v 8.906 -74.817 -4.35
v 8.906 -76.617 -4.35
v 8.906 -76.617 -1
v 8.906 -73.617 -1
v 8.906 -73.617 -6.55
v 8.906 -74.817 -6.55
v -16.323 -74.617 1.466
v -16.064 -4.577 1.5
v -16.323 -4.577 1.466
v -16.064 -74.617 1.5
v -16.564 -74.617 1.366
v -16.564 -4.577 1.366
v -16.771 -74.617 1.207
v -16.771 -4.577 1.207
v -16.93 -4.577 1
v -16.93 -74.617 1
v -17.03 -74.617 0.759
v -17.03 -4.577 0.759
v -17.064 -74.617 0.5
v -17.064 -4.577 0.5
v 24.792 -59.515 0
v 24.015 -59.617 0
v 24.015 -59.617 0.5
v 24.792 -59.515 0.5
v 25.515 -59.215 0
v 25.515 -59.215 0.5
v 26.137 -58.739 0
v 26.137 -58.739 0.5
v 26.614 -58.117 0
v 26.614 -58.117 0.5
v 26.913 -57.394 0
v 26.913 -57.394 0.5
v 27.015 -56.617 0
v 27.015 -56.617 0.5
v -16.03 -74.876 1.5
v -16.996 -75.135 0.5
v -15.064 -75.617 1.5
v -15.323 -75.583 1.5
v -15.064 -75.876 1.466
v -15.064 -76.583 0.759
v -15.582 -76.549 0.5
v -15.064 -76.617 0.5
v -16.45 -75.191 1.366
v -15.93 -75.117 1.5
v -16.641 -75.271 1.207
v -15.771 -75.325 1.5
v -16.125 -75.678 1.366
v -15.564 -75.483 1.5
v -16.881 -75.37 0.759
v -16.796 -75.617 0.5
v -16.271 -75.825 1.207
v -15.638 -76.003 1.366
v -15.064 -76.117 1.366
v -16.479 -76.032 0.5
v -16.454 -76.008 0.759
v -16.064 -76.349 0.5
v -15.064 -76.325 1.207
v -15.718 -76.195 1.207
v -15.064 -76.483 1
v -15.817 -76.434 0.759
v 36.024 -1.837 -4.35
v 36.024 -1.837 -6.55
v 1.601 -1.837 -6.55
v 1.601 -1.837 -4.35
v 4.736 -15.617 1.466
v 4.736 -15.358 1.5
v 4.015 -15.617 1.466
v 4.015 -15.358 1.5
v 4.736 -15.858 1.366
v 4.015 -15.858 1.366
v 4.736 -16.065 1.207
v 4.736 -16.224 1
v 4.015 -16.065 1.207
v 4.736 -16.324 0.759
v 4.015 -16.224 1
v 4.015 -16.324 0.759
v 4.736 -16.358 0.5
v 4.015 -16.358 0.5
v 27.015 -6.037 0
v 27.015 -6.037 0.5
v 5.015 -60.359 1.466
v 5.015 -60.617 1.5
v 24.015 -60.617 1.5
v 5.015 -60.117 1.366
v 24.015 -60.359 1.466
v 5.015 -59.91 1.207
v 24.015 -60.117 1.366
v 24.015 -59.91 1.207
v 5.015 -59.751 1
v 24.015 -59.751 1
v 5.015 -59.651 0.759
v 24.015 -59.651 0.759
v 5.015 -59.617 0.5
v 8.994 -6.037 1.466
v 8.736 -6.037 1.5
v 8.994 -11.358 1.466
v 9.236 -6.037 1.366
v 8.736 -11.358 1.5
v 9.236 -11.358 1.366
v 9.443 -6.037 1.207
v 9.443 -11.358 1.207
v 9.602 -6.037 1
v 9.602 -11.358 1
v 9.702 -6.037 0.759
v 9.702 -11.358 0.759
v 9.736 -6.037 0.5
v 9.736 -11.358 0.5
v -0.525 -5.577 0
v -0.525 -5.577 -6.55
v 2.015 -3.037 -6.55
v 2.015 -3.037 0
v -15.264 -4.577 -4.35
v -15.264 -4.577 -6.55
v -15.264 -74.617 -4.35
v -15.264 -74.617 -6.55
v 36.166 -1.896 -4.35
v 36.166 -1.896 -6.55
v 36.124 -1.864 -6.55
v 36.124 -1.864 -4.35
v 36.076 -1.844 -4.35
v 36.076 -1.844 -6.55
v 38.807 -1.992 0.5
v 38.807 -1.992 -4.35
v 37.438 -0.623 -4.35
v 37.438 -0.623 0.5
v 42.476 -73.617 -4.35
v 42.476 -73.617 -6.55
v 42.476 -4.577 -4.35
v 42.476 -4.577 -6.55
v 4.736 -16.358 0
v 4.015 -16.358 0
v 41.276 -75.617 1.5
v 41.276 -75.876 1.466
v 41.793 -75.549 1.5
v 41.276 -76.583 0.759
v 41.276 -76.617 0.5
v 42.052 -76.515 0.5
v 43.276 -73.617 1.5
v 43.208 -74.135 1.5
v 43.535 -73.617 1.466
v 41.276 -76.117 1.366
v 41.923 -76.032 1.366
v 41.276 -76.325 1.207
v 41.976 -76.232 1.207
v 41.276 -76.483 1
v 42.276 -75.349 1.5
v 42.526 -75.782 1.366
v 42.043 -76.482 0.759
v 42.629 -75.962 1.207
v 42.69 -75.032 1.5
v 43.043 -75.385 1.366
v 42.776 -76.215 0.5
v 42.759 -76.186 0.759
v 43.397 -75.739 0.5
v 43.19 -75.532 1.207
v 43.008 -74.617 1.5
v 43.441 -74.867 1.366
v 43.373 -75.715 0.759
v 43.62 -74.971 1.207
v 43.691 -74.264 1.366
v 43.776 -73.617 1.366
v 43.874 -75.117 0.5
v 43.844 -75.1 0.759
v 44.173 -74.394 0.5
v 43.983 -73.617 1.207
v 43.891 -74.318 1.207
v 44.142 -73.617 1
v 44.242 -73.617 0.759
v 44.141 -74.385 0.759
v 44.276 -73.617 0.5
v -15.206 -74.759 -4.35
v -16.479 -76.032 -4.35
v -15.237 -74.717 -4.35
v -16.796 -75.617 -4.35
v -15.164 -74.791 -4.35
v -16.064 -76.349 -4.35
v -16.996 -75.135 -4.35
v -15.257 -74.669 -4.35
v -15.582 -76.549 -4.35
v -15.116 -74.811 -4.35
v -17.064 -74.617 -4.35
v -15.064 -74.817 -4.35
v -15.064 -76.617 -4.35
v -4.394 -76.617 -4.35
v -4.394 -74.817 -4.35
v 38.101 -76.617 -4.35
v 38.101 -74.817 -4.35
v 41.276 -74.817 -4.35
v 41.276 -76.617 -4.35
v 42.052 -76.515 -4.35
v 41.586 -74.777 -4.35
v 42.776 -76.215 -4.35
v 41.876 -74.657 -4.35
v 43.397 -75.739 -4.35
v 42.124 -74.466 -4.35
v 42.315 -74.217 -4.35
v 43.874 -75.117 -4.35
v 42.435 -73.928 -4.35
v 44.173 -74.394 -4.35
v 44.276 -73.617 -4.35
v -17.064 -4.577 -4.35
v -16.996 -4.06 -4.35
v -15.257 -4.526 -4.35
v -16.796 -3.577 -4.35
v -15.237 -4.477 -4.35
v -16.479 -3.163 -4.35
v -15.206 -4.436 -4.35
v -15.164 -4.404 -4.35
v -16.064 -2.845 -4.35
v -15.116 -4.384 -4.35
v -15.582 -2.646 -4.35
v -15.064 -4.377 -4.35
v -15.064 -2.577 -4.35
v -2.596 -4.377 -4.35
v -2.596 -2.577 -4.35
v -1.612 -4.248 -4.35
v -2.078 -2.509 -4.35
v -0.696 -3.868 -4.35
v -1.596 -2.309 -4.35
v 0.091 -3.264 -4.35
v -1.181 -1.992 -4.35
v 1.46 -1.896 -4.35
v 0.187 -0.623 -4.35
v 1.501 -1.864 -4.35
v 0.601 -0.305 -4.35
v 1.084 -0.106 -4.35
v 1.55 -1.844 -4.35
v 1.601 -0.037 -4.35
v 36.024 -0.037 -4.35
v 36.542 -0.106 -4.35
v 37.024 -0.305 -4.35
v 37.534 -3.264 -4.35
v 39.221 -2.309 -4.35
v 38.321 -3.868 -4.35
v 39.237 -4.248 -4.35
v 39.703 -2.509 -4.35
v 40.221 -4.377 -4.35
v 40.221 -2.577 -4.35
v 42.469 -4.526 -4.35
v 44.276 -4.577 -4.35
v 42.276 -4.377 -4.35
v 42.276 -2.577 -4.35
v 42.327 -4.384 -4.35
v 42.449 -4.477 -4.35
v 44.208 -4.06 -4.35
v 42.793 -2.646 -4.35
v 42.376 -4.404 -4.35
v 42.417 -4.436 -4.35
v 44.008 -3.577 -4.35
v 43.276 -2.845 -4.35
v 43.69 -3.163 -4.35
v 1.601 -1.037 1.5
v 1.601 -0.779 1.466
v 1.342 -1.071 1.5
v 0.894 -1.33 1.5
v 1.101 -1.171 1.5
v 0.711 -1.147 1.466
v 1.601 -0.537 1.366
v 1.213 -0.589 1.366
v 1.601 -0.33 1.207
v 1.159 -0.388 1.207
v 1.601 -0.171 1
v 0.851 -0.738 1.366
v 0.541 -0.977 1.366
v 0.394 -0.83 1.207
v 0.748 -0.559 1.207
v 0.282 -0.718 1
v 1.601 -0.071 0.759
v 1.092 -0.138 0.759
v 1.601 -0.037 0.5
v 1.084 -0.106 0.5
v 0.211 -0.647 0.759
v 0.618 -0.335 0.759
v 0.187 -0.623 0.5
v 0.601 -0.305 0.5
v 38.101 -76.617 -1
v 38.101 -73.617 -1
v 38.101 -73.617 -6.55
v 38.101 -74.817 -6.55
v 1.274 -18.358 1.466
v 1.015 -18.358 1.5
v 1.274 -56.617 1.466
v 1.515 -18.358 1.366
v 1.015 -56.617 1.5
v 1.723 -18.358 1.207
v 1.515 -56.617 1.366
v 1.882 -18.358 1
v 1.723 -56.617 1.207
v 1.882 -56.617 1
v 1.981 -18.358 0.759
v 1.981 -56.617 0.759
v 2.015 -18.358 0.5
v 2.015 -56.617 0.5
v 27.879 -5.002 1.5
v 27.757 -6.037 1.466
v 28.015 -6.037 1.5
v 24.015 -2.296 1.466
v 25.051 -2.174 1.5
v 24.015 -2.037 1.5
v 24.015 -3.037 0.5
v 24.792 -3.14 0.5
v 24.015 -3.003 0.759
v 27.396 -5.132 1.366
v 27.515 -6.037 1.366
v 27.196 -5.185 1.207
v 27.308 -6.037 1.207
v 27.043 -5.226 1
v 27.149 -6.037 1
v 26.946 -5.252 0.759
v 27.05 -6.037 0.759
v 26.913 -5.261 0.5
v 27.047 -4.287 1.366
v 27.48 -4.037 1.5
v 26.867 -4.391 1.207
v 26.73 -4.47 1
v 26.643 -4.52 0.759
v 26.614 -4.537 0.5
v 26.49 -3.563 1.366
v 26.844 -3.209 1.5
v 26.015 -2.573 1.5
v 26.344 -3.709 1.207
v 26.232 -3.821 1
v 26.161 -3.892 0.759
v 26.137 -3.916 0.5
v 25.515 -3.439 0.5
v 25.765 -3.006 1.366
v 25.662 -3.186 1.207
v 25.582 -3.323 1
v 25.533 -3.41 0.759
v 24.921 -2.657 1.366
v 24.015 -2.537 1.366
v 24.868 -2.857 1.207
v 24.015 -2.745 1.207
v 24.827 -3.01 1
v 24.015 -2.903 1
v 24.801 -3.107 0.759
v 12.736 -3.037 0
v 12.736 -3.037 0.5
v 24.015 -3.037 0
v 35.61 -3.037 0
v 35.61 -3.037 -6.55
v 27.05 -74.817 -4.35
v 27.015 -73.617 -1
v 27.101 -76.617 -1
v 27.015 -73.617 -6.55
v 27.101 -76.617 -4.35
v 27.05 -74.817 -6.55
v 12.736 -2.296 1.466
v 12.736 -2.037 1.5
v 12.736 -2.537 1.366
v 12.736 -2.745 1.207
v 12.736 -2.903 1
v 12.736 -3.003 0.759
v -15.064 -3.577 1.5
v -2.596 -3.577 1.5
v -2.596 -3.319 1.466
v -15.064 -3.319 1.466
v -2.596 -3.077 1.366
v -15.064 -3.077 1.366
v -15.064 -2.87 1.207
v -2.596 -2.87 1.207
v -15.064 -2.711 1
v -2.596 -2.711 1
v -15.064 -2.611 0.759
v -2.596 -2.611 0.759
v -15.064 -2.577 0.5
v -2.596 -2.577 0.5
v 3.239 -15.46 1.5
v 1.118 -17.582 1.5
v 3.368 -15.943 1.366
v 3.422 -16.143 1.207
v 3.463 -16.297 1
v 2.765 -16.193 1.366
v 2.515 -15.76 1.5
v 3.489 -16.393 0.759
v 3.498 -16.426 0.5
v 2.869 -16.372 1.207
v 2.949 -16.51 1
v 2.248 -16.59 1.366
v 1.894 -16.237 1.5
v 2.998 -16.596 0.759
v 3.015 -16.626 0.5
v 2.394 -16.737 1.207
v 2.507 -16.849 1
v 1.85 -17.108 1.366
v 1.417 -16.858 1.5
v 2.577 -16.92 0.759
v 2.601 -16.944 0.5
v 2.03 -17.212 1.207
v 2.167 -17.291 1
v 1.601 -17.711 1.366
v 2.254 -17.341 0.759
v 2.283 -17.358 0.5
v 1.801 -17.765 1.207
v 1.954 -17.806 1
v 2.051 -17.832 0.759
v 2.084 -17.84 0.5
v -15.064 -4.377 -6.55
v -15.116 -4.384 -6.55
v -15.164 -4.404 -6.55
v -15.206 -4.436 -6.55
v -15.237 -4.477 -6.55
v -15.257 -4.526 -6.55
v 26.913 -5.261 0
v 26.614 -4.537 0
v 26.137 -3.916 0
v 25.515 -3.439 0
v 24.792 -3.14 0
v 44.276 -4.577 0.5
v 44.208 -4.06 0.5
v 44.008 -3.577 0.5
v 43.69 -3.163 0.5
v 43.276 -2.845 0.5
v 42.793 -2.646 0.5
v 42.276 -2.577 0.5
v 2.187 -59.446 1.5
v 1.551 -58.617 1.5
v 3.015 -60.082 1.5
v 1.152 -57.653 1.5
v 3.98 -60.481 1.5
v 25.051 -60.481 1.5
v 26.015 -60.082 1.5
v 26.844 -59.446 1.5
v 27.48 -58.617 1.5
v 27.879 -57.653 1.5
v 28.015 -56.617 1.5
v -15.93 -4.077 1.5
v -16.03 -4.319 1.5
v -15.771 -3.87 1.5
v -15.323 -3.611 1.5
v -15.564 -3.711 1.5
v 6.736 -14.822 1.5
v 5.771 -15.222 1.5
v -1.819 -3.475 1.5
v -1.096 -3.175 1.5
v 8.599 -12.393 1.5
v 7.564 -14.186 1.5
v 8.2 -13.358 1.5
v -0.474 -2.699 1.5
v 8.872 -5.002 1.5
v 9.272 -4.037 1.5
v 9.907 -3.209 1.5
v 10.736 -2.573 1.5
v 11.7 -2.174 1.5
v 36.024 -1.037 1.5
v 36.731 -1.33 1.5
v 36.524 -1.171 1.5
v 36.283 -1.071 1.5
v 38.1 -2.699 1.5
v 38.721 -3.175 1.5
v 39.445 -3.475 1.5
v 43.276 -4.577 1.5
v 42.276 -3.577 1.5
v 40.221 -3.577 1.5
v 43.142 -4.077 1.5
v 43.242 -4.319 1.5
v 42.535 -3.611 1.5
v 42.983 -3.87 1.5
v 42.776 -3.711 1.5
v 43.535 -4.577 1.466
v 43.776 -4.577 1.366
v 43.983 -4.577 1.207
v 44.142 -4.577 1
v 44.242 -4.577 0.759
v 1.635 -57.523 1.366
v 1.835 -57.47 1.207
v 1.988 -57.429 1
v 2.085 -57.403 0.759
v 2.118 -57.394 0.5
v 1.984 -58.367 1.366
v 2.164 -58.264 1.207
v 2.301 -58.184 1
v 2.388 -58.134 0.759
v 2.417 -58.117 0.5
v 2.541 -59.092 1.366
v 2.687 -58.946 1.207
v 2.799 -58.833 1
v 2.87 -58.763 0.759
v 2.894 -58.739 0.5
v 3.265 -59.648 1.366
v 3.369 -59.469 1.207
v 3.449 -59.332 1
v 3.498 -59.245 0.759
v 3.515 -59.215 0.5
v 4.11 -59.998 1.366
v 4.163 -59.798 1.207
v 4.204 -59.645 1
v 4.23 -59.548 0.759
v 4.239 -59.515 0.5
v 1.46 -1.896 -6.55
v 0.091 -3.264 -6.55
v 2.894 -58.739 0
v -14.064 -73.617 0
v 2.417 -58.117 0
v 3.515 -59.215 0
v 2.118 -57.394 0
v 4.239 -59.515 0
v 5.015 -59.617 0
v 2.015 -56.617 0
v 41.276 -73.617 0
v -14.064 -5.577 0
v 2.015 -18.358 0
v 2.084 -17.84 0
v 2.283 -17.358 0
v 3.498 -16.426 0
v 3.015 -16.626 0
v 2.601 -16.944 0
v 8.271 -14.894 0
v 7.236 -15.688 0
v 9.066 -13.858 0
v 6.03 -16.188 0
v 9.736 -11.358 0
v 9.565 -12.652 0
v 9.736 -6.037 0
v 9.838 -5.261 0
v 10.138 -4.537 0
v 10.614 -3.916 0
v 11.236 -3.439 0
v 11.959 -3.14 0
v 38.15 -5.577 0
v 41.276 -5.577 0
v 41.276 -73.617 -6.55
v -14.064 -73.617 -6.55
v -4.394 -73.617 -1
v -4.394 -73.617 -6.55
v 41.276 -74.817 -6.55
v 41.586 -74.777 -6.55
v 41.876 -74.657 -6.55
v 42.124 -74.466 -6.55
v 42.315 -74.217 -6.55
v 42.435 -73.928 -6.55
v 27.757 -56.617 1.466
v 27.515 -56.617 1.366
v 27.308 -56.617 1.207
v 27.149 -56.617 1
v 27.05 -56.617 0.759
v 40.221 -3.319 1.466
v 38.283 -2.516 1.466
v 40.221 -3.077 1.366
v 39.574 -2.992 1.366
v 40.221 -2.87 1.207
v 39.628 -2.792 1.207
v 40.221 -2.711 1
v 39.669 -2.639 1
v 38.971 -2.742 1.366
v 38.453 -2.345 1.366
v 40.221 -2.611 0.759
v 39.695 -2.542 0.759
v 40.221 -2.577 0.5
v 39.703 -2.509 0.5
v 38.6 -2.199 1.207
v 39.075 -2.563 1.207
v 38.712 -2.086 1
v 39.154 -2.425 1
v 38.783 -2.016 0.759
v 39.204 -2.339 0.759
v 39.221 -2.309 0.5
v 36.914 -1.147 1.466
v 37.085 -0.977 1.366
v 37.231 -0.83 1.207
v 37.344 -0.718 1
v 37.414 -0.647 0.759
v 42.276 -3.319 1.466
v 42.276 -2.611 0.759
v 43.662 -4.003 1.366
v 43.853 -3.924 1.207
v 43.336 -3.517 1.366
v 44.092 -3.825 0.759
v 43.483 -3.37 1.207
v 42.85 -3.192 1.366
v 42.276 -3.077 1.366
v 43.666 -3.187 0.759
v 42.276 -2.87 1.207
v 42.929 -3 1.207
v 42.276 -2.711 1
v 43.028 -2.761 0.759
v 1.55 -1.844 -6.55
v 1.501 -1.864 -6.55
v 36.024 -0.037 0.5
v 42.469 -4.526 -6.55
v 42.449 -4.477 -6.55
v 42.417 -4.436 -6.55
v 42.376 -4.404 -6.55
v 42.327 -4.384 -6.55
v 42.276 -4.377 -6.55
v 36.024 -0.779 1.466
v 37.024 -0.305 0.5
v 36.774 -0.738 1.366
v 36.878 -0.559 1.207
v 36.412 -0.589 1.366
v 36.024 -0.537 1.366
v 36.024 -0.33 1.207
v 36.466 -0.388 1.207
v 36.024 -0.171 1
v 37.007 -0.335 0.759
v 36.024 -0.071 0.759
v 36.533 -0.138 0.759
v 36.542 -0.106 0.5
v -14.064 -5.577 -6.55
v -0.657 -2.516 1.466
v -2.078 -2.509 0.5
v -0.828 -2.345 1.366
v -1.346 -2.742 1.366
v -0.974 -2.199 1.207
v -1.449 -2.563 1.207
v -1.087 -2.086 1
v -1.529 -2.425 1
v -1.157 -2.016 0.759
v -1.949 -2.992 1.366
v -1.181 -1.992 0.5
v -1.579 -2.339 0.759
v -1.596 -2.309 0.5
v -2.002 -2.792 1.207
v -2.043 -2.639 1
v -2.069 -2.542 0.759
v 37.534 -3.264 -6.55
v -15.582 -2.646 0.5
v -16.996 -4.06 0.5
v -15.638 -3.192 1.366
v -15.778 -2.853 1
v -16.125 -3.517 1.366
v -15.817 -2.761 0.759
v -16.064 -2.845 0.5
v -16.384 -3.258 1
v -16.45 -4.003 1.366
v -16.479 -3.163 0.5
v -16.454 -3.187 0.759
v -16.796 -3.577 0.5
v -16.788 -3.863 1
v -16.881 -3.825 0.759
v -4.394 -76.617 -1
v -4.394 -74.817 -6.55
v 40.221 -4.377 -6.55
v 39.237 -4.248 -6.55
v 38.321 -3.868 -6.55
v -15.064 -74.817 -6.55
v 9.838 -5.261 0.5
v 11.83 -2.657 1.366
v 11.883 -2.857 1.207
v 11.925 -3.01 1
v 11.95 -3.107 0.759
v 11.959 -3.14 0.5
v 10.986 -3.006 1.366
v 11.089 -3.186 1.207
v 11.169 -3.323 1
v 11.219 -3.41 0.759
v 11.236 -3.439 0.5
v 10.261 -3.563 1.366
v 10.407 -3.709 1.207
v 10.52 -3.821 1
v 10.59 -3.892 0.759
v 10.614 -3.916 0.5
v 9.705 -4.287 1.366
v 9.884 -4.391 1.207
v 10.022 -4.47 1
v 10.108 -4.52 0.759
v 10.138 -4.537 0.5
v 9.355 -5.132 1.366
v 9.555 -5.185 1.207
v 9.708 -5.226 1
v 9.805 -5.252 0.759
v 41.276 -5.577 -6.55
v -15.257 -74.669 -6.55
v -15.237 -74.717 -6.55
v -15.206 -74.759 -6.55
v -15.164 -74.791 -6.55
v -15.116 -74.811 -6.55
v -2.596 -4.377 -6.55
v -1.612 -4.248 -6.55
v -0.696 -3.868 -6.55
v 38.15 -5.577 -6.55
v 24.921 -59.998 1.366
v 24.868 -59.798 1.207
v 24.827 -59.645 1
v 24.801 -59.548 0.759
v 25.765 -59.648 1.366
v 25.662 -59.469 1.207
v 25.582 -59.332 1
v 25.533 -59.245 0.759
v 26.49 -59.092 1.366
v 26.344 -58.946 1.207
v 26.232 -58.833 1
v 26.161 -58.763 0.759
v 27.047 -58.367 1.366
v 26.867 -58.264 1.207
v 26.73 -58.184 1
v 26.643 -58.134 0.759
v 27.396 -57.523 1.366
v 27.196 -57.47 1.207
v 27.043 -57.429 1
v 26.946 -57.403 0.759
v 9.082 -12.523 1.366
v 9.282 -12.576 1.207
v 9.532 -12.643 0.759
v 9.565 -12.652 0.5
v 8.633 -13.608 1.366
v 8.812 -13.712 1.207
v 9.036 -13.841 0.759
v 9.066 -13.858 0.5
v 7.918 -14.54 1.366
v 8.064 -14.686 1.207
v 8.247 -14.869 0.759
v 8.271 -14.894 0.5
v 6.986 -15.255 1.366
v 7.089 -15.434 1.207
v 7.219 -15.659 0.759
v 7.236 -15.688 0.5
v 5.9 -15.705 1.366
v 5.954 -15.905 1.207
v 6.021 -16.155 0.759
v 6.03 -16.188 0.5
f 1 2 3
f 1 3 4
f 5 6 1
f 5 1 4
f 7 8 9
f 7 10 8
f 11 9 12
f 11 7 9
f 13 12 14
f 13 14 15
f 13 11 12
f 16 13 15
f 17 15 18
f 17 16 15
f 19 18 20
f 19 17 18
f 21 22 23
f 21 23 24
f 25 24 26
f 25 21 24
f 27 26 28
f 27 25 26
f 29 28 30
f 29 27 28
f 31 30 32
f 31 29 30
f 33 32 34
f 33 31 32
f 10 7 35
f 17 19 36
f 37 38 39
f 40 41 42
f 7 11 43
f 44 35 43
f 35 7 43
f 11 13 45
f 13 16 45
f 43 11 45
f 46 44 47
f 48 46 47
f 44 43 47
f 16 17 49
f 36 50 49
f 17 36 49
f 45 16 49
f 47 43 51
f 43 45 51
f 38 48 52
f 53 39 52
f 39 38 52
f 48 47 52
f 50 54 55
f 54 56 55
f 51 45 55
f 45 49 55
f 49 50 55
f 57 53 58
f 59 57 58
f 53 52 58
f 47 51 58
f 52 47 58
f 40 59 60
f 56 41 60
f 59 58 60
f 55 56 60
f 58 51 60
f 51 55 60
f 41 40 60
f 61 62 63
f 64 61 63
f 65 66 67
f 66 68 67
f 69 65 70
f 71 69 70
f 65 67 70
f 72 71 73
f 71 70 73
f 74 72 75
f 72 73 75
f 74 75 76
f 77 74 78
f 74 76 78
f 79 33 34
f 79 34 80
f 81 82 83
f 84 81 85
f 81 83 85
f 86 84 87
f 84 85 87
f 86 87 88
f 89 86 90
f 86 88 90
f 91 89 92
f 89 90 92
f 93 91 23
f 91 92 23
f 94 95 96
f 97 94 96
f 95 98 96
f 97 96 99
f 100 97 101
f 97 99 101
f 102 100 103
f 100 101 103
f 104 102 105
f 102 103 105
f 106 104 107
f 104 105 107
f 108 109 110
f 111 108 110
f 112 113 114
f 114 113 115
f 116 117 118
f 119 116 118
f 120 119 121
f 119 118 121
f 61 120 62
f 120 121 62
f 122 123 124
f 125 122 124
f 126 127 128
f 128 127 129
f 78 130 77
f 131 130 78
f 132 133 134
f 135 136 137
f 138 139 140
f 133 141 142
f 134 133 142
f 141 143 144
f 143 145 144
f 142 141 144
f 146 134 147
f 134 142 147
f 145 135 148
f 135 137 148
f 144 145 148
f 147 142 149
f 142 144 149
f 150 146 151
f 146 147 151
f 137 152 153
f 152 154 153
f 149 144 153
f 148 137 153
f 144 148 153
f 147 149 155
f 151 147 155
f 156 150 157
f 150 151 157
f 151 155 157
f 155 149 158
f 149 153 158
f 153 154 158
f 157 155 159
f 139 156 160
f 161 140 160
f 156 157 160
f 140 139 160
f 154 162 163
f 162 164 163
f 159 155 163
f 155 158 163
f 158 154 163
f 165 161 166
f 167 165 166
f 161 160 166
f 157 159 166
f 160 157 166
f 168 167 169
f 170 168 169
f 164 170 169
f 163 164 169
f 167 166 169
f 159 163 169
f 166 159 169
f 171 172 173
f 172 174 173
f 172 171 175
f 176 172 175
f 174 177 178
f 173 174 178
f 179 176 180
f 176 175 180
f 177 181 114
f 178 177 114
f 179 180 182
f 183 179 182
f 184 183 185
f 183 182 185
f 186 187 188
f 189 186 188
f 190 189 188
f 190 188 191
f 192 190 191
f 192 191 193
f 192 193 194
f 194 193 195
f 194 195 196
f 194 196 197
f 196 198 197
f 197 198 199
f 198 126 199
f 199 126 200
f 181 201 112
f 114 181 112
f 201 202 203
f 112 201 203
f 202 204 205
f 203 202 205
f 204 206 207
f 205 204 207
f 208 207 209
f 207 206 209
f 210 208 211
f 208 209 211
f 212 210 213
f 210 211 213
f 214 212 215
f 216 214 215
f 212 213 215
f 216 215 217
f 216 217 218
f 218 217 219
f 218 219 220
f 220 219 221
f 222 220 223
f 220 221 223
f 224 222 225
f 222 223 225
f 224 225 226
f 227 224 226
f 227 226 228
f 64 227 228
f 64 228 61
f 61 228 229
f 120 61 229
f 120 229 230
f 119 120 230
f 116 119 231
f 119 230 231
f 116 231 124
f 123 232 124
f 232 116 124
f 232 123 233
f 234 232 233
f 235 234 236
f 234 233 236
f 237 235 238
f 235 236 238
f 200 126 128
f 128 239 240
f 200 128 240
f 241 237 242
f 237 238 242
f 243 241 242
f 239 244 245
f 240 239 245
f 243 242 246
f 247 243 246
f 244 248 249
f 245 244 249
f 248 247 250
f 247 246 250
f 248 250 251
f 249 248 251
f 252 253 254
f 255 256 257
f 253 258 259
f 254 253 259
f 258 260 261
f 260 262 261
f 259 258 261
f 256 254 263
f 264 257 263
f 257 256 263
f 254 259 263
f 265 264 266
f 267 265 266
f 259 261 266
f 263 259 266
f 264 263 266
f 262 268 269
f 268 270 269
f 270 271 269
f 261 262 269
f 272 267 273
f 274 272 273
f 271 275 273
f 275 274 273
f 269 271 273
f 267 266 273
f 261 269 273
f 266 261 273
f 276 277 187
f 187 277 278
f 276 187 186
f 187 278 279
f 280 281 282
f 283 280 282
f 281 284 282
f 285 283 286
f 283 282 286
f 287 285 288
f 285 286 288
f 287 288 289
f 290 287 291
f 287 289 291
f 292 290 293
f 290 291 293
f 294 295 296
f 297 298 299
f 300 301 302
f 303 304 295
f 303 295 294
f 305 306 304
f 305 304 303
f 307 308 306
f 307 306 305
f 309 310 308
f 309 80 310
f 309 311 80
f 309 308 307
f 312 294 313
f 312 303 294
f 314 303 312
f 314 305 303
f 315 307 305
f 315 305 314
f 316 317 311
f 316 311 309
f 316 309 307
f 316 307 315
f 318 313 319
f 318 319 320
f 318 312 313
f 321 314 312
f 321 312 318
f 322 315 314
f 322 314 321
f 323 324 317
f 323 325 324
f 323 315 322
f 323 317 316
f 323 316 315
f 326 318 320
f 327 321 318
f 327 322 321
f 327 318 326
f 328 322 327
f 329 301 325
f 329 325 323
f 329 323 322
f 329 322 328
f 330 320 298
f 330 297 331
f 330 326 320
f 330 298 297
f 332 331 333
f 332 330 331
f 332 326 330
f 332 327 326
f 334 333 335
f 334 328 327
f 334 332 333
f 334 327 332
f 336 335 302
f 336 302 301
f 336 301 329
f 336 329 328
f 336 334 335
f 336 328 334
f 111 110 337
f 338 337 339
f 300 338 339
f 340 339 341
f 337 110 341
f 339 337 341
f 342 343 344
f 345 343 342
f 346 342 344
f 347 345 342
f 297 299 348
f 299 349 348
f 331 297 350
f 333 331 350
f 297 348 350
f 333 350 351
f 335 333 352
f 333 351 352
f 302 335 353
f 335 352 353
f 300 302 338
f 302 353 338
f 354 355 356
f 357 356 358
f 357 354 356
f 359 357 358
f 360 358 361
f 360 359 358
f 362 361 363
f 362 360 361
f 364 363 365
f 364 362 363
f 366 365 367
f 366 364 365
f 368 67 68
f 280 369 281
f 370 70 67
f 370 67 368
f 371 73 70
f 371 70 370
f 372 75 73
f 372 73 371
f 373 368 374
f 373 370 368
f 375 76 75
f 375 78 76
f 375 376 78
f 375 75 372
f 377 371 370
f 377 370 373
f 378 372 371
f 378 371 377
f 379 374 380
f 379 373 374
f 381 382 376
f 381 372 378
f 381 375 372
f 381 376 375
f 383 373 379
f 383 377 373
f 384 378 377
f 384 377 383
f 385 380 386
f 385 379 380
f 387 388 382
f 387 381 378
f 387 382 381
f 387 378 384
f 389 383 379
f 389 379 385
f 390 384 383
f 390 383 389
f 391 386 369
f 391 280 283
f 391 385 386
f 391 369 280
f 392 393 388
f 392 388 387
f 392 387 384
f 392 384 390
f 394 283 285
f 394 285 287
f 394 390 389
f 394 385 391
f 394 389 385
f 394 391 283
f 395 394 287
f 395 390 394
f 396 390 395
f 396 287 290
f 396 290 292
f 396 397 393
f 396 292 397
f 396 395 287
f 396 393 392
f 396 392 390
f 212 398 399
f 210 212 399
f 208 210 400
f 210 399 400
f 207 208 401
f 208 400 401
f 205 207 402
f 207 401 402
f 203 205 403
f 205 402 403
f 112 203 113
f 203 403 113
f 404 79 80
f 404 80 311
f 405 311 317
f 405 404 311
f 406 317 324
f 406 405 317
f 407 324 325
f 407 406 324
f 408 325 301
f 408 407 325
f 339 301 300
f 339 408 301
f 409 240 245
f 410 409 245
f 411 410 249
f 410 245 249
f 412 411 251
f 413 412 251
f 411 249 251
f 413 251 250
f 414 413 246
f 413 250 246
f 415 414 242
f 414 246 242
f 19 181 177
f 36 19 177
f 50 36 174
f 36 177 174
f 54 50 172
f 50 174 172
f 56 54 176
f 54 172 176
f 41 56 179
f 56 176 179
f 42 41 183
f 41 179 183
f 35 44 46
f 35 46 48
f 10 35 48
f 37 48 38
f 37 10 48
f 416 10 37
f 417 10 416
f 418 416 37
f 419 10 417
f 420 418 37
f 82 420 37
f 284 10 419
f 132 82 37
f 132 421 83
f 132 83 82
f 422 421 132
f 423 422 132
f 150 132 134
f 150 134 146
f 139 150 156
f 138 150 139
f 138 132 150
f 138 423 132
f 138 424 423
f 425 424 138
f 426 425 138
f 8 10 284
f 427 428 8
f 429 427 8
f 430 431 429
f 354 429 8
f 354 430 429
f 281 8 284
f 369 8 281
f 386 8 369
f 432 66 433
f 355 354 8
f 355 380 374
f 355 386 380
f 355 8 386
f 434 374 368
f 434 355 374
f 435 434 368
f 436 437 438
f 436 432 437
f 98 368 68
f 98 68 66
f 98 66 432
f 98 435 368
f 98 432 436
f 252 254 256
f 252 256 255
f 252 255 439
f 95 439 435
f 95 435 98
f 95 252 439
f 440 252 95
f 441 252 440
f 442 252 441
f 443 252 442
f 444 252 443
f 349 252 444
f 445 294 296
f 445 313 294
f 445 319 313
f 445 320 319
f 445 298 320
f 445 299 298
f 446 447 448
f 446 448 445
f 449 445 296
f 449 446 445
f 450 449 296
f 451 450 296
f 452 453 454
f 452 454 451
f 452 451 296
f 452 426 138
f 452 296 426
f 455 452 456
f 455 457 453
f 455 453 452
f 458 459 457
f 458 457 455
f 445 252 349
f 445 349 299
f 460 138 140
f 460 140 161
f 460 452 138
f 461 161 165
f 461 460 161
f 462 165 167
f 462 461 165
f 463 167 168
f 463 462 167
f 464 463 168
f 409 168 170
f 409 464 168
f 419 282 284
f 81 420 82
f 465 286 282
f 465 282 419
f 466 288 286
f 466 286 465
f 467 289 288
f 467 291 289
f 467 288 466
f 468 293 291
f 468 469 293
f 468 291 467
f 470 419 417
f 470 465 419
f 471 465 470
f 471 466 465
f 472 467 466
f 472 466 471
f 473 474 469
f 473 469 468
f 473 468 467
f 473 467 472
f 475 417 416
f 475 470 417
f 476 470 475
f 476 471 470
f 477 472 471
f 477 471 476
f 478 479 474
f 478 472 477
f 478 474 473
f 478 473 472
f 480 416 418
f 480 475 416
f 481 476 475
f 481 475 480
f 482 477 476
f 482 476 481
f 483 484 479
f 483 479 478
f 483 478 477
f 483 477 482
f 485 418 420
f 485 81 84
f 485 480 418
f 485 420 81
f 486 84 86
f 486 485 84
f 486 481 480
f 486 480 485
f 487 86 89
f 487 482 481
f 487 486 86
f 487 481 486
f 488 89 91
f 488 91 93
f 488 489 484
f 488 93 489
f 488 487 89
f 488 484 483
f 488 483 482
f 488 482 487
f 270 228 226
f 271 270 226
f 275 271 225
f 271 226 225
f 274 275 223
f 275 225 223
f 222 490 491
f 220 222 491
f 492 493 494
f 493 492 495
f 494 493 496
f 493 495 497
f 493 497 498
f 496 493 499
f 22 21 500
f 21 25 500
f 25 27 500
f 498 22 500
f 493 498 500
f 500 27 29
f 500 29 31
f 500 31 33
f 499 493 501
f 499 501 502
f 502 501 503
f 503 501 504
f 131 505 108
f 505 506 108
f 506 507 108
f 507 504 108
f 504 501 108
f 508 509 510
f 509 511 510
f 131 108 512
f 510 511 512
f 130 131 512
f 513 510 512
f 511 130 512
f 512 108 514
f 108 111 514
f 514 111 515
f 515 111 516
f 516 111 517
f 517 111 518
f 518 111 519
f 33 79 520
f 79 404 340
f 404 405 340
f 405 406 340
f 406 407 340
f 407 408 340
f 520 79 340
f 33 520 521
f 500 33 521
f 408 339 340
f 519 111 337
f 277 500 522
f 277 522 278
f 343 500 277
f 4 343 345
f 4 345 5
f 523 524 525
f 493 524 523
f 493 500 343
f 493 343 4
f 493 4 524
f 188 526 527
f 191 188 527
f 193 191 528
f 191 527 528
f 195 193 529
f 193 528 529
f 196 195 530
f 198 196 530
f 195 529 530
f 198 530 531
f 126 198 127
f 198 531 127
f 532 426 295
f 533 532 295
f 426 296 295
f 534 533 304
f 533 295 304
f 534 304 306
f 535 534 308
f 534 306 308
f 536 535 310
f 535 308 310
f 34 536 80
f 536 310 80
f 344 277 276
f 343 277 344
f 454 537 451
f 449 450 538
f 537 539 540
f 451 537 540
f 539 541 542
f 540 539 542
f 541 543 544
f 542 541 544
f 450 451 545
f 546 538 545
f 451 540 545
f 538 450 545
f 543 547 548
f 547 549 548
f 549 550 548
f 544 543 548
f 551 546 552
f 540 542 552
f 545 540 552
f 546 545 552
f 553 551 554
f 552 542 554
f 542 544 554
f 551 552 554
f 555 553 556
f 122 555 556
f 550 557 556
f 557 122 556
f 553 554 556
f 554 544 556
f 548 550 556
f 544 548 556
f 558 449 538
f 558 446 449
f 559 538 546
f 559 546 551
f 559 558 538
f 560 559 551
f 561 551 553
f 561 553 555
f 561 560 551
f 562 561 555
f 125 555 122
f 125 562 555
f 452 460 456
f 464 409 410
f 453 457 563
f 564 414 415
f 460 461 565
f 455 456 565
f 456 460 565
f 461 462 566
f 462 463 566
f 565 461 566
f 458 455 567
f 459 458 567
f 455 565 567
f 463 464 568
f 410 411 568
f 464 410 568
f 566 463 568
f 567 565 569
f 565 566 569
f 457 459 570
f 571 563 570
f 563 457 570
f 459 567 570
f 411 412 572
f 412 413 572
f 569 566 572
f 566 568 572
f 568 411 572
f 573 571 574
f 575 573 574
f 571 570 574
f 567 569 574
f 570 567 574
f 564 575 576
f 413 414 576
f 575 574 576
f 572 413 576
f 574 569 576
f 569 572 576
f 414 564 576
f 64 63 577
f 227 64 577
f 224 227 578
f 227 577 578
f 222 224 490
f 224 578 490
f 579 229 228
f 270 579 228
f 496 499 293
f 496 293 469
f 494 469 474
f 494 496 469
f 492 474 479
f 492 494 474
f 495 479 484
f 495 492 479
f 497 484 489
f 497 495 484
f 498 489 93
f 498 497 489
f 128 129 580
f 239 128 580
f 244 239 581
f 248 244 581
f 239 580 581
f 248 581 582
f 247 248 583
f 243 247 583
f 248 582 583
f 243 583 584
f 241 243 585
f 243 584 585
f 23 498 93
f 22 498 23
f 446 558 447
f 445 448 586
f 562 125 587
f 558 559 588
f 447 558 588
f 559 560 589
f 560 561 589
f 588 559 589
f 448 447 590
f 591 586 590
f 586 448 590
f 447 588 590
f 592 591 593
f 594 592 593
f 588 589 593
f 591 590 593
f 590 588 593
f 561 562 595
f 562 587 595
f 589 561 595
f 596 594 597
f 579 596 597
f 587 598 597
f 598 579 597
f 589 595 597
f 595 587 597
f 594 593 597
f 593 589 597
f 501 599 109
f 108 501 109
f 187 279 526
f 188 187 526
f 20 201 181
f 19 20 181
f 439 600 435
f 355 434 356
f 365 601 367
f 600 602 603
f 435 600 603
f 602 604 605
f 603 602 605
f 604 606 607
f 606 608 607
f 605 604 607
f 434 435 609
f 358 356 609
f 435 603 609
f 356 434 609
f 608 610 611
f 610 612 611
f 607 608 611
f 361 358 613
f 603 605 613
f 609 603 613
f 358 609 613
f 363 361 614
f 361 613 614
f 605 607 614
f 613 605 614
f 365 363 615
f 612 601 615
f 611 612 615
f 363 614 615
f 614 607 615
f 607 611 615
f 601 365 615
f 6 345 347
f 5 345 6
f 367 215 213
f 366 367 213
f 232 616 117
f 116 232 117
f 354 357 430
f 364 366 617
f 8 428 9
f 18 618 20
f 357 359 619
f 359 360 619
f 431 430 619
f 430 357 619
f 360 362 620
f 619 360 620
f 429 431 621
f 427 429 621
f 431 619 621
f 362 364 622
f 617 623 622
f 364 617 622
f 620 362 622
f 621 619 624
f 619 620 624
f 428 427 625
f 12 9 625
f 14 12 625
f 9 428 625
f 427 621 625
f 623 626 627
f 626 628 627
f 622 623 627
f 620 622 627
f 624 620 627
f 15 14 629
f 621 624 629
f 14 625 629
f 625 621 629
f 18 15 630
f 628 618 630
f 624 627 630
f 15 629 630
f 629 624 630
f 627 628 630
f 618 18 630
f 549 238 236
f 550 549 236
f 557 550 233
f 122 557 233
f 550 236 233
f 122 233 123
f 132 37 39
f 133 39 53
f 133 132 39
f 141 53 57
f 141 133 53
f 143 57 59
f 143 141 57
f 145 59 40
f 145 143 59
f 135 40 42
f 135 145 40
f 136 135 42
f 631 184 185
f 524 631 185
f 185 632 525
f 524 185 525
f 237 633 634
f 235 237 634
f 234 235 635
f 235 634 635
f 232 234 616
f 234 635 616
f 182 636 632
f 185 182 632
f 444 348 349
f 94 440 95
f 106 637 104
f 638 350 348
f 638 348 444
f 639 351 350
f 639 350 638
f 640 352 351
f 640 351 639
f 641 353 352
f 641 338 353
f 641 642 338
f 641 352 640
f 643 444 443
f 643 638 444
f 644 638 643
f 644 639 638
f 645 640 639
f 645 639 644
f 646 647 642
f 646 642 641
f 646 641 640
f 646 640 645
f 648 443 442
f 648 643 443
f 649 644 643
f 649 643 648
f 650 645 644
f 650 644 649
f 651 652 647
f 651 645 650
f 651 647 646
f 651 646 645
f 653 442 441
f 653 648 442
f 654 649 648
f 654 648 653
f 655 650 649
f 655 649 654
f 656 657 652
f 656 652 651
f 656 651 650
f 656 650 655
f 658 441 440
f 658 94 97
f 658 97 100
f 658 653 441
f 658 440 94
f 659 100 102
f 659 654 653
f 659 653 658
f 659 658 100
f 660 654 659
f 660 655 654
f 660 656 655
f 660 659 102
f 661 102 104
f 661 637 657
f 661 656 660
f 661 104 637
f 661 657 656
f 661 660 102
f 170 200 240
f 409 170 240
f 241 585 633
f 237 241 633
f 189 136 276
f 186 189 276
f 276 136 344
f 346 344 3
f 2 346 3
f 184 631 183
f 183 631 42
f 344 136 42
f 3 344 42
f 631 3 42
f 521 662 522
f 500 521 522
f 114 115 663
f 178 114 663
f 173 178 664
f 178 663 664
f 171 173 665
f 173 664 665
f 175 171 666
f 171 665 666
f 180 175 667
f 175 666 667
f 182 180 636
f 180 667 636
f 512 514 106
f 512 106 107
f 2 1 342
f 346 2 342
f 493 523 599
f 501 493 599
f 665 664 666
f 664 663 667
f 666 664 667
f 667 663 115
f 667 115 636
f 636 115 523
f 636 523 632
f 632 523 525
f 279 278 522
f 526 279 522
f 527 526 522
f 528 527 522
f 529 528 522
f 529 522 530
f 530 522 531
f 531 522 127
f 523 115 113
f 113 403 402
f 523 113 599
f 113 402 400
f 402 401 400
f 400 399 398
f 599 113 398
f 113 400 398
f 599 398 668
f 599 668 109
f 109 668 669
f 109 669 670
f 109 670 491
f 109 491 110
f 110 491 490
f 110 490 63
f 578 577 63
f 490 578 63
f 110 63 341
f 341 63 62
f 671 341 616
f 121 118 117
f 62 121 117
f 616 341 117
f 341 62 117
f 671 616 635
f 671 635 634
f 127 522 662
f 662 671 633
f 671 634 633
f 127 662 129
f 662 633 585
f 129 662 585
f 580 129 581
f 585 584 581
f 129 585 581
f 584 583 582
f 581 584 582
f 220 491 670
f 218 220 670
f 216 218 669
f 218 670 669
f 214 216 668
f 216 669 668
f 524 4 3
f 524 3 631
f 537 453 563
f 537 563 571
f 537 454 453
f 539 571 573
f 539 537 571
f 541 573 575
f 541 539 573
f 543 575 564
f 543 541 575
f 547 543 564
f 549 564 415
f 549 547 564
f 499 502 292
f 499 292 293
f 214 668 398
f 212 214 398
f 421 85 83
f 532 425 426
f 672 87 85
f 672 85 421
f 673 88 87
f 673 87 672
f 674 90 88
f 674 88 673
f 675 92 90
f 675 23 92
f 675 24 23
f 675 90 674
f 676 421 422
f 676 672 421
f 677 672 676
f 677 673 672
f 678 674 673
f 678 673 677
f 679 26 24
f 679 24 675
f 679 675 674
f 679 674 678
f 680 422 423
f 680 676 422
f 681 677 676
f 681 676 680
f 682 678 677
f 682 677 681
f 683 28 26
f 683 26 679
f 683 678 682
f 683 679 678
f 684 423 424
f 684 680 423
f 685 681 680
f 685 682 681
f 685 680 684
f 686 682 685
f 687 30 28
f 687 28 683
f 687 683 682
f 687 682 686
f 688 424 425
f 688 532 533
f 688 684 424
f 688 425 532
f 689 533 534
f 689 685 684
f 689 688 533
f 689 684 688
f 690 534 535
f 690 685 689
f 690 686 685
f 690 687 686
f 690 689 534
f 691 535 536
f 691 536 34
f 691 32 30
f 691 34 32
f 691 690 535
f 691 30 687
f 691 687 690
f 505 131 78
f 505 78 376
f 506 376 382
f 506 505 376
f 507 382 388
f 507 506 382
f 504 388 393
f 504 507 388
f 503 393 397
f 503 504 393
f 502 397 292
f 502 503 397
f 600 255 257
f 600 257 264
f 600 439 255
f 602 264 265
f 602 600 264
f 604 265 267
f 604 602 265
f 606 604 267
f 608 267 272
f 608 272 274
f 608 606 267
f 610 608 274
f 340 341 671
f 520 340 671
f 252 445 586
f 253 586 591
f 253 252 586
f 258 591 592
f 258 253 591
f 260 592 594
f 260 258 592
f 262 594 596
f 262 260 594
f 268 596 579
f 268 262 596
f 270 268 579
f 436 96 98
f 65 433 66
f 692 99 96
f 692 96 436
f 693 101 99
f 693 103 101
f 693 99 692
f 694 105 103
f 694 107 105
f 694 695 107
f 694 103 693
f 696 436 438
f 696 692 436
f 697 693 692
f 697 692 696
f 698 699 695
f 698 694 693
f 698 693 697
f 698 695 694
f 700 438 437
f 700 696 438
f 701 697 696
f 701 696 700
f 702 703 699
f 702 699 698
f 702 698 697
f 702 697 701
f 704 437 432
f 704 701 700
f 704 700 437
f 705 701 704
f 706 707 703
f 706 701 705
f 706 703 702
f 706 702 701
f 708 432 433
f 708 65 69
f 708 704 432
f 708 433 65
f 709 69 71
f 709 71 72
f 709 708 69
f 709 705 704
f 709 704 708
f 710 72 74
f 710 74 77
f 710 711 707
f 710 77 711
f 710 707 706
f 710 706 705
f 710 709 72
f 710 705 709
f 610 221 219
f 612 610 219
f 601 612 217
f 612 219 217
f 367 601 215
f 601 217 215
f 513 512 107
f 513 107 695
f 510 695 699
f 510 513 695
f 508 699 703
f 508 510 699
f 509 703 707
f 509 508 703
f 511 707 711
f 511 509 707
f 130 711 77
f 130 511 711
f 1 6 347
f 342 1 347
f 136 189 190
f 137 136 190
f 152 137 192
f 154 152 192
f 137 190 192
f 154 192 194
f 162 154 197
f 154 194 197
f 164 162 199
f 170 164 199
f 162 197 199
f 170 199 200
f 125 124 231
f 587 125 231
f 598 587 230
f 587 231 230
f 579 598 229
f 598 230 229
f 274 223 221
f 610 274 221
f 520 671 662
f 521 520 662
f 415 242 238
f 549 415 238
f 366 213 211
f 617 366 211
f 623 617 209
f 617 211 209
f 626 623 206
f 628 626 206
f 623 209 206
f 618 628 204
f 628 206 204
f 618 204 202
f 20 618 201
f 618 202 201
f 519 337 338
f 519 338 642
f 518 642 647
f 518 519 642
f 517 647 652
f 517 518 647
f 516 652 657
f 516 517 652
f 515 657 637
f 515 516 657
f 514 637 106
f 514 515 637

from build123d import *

# Parameters (mm, degrees)
BOSS_EXTRUDE1_DEPTH = 1.5
BOSS_EXTRUDE2_START = 6.55
BOSS_EXTRUDE2_DEPTH = 6.55
SKETCH4_W           = 11.085213563
SKETCH4_H           = 3
SKETCH4_W_2         = 13.3
BOSS_EXTRUDE4_DEPTH = 1
CUT_EXTRUDE1_DEPTH  = 2.2
FILLET1_R           = 1


with BuildPart() as part:
    # Sketch2 → Boss-Extrude1 (new body)
    with BuildSketch(Plane.XY):
        with BuildLine():
            Line((-15.064293146, -76.617402573), (-4.394293146, -76.617402573))
            Line((-4.394293146, -76.617402573), (41.275706854, -76.617402573))
            ThreePointArc((41.275706854, -76.617402573), (43.397027197, -75.738722916), (44.275706854, -73.617402573))
            Line((44.275706854, -73.617402573), (44.275706854, -4.577402573))
            ThreePointArc((44.275706854, -4.577402573), (43.689920416, -3.16318901), (42.275706854, -2.577402573))
            Line((42.275706854, -2.577402573), (40.220988228, -2.577402573))
            ThreePointArc((40.220988228, -2.577402573), (39.455621363, -2.425161638), (38.806774666, -1.991616135))
            Line((38.806774666, -1.991616135), (37.438347541, -0.62318901))
            ThreePointArc((37.438347541, -0.62318901), (36.789500843, -0.189643508), (36.024133979, -0.037402573))
            Line((36.024133979, -0.037402573), (1.601279729, -0.037402573))
            ThreePointArc((1.601279729, -0.037402573), (0.835912864, -0.189643508), (0.187066167, -0.62318901))
            Line((0.187066167, -0.62318901), (-1.181360958, -1.991616135))
            ThreePointArc((-1.181360958, -1.991616135), (-1.830207656, -2.425161638), (-2.59557452, -2.577402573))
            Line((-2.59557452, -2.577402573), (-15.064293146, -2.577402573))
            ThreePointArc((-15.064293146, -2.577402573), (-16.478506709, -3.16318901), (-17.064293146, -4.577402573))
            Line((-17.064293146, -4.577402573), (-17.064293146, -74.617402573))
            ThreePointArc((-17.064293146, -74.617402573), (-16.478506709, -76.031616135), (-15.064293146, -76.617402573))
        make_face()
        with BuildLine():
            Line((5.015493291, -59.617402573), (24.015493291, -59.617402573))
            ThreePointArc((24.015493291, -59.617402573), (26.136813635, -58.738722916), (27.015493291, -56.617402573))
            Line((27.015493291, -56.617402573), (27.015493291, -6.037402573))
            ThreePointArc((27.015493291, -6.037402573), (26.136813635, -3.916082229), (24.015493291, -3.037402573))
            Line((24.015493291, -3.037402573), (12.735677005, -3.037402573))
            ThreePointArc((12.735677005, -3.037402573), (10.614356661, -3.916082229), (9.735677005, -6.037402573))
            Line((9.735677005, -6.037402573), (9.735677005, -11.358022899))
            ThreePointArc((9.735677005, -11.358022899), (8.271210911, -14.893556805), (4.735677005, -16.358022899))
            Line((4.735677005, -16.358022899), (4.015493291, -16.358022899))
            ThreePointArc((4.015493291, -16.358022899), (2.601279729, -16.943809336), (2.015493291, -18.358022899))
            Line((2.015493291, -18.358022899), (2.015493291, -56.617402573))
            ThreePointArc((2.015493291, -56.617402573), (2.894172948, -58.738722916), (5.015493291, -59.617402573))
        make_face(mode=Mode.SUBTRACT)
    extrude(amount=BOSS_EXTRUDE1_DEPTH)

    # Sketch3 → Boss-Extrude2 (add)
    with BuildSketch(Plane(origin=(0, 0, 0), x_dir=(-1, 0, 0), z_dir=(0, 0, -1)).offset(BOSS_EXTRUDE2_START)):
        with BuildLine():
            Line((4.394293146, -75.117402573), (4.394293146, -73.617402573))
            Line((4.394293146, -73.617402573), (14.064293146, -73.617402573))
            Line((14.064293146, -73.617402573), (14.064293146, -5.577402573))
            Line((14.064293146, -5.577402573), (0.524506709, -5.577402573))
            Line((0.524506709, -5.577402573), (-2.015493291, -3.037402573))
            Line((-2.015493291, -3.037402573), (-35.609920416, -3.037402573))
            Line((-35.609920416, -3.037402573), (-38.149920416, -5.577402573))
            Line((-38.149920416, -5.577402573), (-41.275706854, -5.577402573))
            Line((-41.275706854, -5.577402573), (-41.275706854, -73.617402573))
            Line((-41.275706854, -73.617402573), (-38.100706854, -73.617402573))
            Line((-38.100706854, -73.617402573), (-38.100706854, -75.117402573))
            Line((-38.100706854, -75.117402573), (-38.100706854, -76.617402573))
            Line((-38.100706854, -76.617402573), (-41.275706854, -76.617402573))
            ThreePointArc((-41.275706854, -76.617402573), (-43.397027197, -75.738722916), (-44.275706854, -73.617402573))
            Line((-44.275706854, -73.617402573), (-44.275706854, -4.577402573))
            ThreePointArc((-44.275706854, -4.577402573), (-43.689920416, -3.16318901), (-42.275706854, -2.577402573))
            Line((-42.275706854, -2.577402573), (-40.220988228, -2.577402573))
            ThreePointArc((-40.220988228, -2.577402573), (-39.455621363, -2.425161638), (-38.806774666, -1.991616135))
            Line((-38.806774666, -1.991616135), (-37.438347541, -0.62318901))
            ThreePointArc((-37.438347541, -0.62318901), (-36.789500843, -0.189643508), (-36.024133979, -0.037402573))
            Line((-36.024133979, -0.037402573), (-1.601279729, -0.037402573))
            ThreePointArc((-1.601279729, -0.037402573), (-0.835912864, -0.189643508), (-0.187066167, -0.62318901))
            Line((-0.187066167, -0.62318901), (1.181360958, -1.991616135))
            ThreePointArc((1.181360958, -1.991616135), (1.830207656, -2.425161638), (2.59557452, -2.577402573))
            Line((2.59557452, -2.577402573), (15.064293146, -2.577402573))
            ThreePointArc((15.064293146, -2.577402573), (16.478506709, -3.16318901), (17.064293146, -4.577402573))
            Line((17.064293146, -4.577402573), (17.064293146, -74.617402573))
            ThreePointArc((17.064293146, -74.617402573), (16.478506709, -76.031616135), (15.064293146, -76.617402573))
            Line((15.064293146, -76.617402573), (4.394293146, -76.617402573))
            Line((4.394293146, -76.617402573), (4.394293146, -75.117402573))
        make_face()
        Polygon((-8.905706854, -76.617402573), (-8.905706854, -73.617402573), (-27.015493291, -73.617402573), (-27.100706854, -76.617402573), align=None)
    extrude(amount=-BOSS_EXTRUDE2_DEPTH)

    # Sketch4 → Boss-Extrude4 (add)
    with BuildSketch(Plane(origin=(0, 0, 0), x_dir=(-1, 0, 0), z_dir=(0, 0, -1))):
        with Locations((-32.558100073, -75.117402573)):
            Rectangle(SKETCH4_W, SKETCH4_H)
        with Locations((-2.255706854, -75.117402573)):
            Rectangle(SKETCH4_W_2, SKETCH4_H)
    extrude(amount=BOSS_EXTRUDE4_DEPTH)

    # Sketch6 → Cut-Extrude1 (cut)
    with BuildSketch(Plane(origin=(0, 0, -6.55), x_dir=(-1, 0, 0), z_dir=(0, 0, -1))):
        with BuildLine():
            Line((17.064293146, -4.577402573), (17.064293146, -74.617402573))
            ThreePointArc((17.064293146, -74.617402573), (16.478506709, -76.031616135), (15.064293146, -76.617402573))
            Line((15.064293146, -76.617402573), (4.394293146, -76.617402573))
            Line((4.394293146, -76.617402573), (-8.905706854, -76.617402573))
            Line((-8.905706854, -76.617402573), (-27.100706854, -76.617402573))
            Line((-27.100706854, -76.617402573), (-38.100706854, -76.617402573))
            Line((-38.100706854, -76.617402573), (-41.275706854, -76.617402573))
            ThreePointArc((-41.275706854, -76.617402573), (-43.397027197, -75.738722916), (-44.275706854, -73.617402573))
            Line((-44.275706854, -73.617402573), (-44.275706854, -4.577402573))
            ThreePointArc((-44.275706854, -4.577402573), (-43.689920416, -3.16318901), (-42.275706854, -2.577402573))
            Line((-42.275706854, -2.577402573), (-40.220988228, -2.577402573))
            ThreePointArc((-40.220988228, -2.577402573), (-39.455621363, -2.425161638), (-38.806774666, -1.991616135))
            Line((-38.806774666, -1.991616135), (-37.438347541, -0.62318901))
            ThreePointArc((-37.438347541, -0.62318901), (-36.789500843, -0.189643508), (-36.024133979, -0.037402573))
            Line((-36.024133979, -0.037402573), (-1.601279729, -0.037402573))
            ThreePointArc((-1.601279729, -0.037402573), (-0.835912864, -0.189643508), (-0.187066167, -0.62318901))
            Line((-0.187066167, -0.62318901), (1.181360958, -1.991616135))
            ThreePointArc((1.181360958, -1.991616135), (1.830207656, -2.425161638), (2.59557452, -2.577402573))
            Line((2.59557452, -2.577402573), (15.064293146, -2.577402573))
            ThreePointArc((15.064293146, -2.577402573), (16.478506709, -3.16318901), (17.064293146, -4.577402573))
        make_face()
        with BuildLine():
            Line((-38.100706854, -74.817402573), (-41.275706854, -74.817402573))
            ThreePointArc((-41.275706854, -74.817402573), (-42.124234991, -74.46593071), (-42.475706854, -73.617402573))
            Line((-42.475706854, -73.617402573), (-42.475706854, -4.577402573))
            ThreePointArc((-42.475706854, -4.577402573), (-42.41712821, -4.435981216), (-42.275706854, -4.377402573))
            Line((-42.275706854, -4.377402573), (-40.220988228, -4.377402573))
            ThreePointArc((-40.220988228, -4.377402573), (-38.766791185, -4.088144796), (-37.53398246, -3.264408341))
            Line((-37.53398246, -3.264408341), (-36.165555335, -1.895981216))
            ThreePointArc((-36.165555335, -1.895981216), (-36.100670665, -1.852626666), (-36.024133979, -1.837402573))
            Line((-36.024133979, -1.837402573), (-1.601279729, -1.837402573))
            ThreePointArc((-1.601279729, -1.837402573), (-1.524743043, -1.852626666), (-1.459858373, -1.895981216))
            Line((-1.459858373, -1.895981216), (-0.091431248, -3.264408341))
            ThreePointArc((-0.091431248, -3.264408341), (1.141377477, -4.088144796), (2.59557452, -4.377402573))
            Line((2.59557452, -4.377402573), (15.064293146, -4.377402573))
            ThreePointArc((15.064293146, -4.377402573), (15.205714502, -4.435981216), (15.264293146, -4.577402573))
            Line((15.264293146, -4.577402573), (15.264293146, -74.617402573))
            ThreePointArc((15.264293146, -74.617402573), (15.205714502, -74.758823929), (15.064293146, -74.817402573))
            Line((15.064293146, -74.817402573), (4.394293146, -74.817402573))
            Line((4.394293146, -74.817402573), (-38.100706854, -74.817402573))
        make_face(mode=Mode.SUBTRACT)
    extrude(amount=-CUT_EXTRUDE1_DEPTH, mode=Mode.SUBTRACT)

    # Fillet1
    fillet1_edges = [part.edges().sort_by_distance(p)[0] for p in [
        (2.601279729, -16.943809336, 1.5),
        (2.015493291, -37.487712736, 1.5),
        (2.894172948, -58.738722916, 1.5),
        (14.515493291, -59.617402573, 1.5),
        (26.136813635, -58.738722916, 1.5),
        (27.015493291, -31.327402573, 1.5),
        (26.136813635, -3.916082229, 1.5),
        (18.375585148, -3.037402573, 1.5),
        (10.614356661, -3.916082229, 1.5),
        (9.735677005, -8.697712736, 1.5),
        (8.271210911, -14.893556805, 1.5),
        (4.375585148, -16.358022899, 1.5),
        (-17.064293146, -39.597402573, 1.5),
        (-16.478506709, -3.16318901, 1.5),
        (-8.829933833, -2.577402573, 1.5),
        (-1.830207656, -2.425161638, 1.5),
        (-0.497147396, -1.307402573, 1.5),
        (0.835912864, -0.189643508, 1.5),
        (18.812706854, -0.037402573, 1.5),
        (36.789500843, -0.189643508, 1.5),
        (38.122561103, -1.307402573, 1.5),
        (39.455621363, -2.425161638, 1.5),
        (41.248347541, -2.577402573, 1.5),
        (43.689920416, -3.16318901, 1.5),
        (44.275706854, -39.097402573, 1.5),
        (43.397027197, -75.738722916, 1.5),
        (13.105706854, -76.617402573, 1.5),
        (-16.478506709, -76.031616135, 1.5),
    ]]
    fillet(fillet1_edges, radius=FILLET1_R)


solid = part.part
